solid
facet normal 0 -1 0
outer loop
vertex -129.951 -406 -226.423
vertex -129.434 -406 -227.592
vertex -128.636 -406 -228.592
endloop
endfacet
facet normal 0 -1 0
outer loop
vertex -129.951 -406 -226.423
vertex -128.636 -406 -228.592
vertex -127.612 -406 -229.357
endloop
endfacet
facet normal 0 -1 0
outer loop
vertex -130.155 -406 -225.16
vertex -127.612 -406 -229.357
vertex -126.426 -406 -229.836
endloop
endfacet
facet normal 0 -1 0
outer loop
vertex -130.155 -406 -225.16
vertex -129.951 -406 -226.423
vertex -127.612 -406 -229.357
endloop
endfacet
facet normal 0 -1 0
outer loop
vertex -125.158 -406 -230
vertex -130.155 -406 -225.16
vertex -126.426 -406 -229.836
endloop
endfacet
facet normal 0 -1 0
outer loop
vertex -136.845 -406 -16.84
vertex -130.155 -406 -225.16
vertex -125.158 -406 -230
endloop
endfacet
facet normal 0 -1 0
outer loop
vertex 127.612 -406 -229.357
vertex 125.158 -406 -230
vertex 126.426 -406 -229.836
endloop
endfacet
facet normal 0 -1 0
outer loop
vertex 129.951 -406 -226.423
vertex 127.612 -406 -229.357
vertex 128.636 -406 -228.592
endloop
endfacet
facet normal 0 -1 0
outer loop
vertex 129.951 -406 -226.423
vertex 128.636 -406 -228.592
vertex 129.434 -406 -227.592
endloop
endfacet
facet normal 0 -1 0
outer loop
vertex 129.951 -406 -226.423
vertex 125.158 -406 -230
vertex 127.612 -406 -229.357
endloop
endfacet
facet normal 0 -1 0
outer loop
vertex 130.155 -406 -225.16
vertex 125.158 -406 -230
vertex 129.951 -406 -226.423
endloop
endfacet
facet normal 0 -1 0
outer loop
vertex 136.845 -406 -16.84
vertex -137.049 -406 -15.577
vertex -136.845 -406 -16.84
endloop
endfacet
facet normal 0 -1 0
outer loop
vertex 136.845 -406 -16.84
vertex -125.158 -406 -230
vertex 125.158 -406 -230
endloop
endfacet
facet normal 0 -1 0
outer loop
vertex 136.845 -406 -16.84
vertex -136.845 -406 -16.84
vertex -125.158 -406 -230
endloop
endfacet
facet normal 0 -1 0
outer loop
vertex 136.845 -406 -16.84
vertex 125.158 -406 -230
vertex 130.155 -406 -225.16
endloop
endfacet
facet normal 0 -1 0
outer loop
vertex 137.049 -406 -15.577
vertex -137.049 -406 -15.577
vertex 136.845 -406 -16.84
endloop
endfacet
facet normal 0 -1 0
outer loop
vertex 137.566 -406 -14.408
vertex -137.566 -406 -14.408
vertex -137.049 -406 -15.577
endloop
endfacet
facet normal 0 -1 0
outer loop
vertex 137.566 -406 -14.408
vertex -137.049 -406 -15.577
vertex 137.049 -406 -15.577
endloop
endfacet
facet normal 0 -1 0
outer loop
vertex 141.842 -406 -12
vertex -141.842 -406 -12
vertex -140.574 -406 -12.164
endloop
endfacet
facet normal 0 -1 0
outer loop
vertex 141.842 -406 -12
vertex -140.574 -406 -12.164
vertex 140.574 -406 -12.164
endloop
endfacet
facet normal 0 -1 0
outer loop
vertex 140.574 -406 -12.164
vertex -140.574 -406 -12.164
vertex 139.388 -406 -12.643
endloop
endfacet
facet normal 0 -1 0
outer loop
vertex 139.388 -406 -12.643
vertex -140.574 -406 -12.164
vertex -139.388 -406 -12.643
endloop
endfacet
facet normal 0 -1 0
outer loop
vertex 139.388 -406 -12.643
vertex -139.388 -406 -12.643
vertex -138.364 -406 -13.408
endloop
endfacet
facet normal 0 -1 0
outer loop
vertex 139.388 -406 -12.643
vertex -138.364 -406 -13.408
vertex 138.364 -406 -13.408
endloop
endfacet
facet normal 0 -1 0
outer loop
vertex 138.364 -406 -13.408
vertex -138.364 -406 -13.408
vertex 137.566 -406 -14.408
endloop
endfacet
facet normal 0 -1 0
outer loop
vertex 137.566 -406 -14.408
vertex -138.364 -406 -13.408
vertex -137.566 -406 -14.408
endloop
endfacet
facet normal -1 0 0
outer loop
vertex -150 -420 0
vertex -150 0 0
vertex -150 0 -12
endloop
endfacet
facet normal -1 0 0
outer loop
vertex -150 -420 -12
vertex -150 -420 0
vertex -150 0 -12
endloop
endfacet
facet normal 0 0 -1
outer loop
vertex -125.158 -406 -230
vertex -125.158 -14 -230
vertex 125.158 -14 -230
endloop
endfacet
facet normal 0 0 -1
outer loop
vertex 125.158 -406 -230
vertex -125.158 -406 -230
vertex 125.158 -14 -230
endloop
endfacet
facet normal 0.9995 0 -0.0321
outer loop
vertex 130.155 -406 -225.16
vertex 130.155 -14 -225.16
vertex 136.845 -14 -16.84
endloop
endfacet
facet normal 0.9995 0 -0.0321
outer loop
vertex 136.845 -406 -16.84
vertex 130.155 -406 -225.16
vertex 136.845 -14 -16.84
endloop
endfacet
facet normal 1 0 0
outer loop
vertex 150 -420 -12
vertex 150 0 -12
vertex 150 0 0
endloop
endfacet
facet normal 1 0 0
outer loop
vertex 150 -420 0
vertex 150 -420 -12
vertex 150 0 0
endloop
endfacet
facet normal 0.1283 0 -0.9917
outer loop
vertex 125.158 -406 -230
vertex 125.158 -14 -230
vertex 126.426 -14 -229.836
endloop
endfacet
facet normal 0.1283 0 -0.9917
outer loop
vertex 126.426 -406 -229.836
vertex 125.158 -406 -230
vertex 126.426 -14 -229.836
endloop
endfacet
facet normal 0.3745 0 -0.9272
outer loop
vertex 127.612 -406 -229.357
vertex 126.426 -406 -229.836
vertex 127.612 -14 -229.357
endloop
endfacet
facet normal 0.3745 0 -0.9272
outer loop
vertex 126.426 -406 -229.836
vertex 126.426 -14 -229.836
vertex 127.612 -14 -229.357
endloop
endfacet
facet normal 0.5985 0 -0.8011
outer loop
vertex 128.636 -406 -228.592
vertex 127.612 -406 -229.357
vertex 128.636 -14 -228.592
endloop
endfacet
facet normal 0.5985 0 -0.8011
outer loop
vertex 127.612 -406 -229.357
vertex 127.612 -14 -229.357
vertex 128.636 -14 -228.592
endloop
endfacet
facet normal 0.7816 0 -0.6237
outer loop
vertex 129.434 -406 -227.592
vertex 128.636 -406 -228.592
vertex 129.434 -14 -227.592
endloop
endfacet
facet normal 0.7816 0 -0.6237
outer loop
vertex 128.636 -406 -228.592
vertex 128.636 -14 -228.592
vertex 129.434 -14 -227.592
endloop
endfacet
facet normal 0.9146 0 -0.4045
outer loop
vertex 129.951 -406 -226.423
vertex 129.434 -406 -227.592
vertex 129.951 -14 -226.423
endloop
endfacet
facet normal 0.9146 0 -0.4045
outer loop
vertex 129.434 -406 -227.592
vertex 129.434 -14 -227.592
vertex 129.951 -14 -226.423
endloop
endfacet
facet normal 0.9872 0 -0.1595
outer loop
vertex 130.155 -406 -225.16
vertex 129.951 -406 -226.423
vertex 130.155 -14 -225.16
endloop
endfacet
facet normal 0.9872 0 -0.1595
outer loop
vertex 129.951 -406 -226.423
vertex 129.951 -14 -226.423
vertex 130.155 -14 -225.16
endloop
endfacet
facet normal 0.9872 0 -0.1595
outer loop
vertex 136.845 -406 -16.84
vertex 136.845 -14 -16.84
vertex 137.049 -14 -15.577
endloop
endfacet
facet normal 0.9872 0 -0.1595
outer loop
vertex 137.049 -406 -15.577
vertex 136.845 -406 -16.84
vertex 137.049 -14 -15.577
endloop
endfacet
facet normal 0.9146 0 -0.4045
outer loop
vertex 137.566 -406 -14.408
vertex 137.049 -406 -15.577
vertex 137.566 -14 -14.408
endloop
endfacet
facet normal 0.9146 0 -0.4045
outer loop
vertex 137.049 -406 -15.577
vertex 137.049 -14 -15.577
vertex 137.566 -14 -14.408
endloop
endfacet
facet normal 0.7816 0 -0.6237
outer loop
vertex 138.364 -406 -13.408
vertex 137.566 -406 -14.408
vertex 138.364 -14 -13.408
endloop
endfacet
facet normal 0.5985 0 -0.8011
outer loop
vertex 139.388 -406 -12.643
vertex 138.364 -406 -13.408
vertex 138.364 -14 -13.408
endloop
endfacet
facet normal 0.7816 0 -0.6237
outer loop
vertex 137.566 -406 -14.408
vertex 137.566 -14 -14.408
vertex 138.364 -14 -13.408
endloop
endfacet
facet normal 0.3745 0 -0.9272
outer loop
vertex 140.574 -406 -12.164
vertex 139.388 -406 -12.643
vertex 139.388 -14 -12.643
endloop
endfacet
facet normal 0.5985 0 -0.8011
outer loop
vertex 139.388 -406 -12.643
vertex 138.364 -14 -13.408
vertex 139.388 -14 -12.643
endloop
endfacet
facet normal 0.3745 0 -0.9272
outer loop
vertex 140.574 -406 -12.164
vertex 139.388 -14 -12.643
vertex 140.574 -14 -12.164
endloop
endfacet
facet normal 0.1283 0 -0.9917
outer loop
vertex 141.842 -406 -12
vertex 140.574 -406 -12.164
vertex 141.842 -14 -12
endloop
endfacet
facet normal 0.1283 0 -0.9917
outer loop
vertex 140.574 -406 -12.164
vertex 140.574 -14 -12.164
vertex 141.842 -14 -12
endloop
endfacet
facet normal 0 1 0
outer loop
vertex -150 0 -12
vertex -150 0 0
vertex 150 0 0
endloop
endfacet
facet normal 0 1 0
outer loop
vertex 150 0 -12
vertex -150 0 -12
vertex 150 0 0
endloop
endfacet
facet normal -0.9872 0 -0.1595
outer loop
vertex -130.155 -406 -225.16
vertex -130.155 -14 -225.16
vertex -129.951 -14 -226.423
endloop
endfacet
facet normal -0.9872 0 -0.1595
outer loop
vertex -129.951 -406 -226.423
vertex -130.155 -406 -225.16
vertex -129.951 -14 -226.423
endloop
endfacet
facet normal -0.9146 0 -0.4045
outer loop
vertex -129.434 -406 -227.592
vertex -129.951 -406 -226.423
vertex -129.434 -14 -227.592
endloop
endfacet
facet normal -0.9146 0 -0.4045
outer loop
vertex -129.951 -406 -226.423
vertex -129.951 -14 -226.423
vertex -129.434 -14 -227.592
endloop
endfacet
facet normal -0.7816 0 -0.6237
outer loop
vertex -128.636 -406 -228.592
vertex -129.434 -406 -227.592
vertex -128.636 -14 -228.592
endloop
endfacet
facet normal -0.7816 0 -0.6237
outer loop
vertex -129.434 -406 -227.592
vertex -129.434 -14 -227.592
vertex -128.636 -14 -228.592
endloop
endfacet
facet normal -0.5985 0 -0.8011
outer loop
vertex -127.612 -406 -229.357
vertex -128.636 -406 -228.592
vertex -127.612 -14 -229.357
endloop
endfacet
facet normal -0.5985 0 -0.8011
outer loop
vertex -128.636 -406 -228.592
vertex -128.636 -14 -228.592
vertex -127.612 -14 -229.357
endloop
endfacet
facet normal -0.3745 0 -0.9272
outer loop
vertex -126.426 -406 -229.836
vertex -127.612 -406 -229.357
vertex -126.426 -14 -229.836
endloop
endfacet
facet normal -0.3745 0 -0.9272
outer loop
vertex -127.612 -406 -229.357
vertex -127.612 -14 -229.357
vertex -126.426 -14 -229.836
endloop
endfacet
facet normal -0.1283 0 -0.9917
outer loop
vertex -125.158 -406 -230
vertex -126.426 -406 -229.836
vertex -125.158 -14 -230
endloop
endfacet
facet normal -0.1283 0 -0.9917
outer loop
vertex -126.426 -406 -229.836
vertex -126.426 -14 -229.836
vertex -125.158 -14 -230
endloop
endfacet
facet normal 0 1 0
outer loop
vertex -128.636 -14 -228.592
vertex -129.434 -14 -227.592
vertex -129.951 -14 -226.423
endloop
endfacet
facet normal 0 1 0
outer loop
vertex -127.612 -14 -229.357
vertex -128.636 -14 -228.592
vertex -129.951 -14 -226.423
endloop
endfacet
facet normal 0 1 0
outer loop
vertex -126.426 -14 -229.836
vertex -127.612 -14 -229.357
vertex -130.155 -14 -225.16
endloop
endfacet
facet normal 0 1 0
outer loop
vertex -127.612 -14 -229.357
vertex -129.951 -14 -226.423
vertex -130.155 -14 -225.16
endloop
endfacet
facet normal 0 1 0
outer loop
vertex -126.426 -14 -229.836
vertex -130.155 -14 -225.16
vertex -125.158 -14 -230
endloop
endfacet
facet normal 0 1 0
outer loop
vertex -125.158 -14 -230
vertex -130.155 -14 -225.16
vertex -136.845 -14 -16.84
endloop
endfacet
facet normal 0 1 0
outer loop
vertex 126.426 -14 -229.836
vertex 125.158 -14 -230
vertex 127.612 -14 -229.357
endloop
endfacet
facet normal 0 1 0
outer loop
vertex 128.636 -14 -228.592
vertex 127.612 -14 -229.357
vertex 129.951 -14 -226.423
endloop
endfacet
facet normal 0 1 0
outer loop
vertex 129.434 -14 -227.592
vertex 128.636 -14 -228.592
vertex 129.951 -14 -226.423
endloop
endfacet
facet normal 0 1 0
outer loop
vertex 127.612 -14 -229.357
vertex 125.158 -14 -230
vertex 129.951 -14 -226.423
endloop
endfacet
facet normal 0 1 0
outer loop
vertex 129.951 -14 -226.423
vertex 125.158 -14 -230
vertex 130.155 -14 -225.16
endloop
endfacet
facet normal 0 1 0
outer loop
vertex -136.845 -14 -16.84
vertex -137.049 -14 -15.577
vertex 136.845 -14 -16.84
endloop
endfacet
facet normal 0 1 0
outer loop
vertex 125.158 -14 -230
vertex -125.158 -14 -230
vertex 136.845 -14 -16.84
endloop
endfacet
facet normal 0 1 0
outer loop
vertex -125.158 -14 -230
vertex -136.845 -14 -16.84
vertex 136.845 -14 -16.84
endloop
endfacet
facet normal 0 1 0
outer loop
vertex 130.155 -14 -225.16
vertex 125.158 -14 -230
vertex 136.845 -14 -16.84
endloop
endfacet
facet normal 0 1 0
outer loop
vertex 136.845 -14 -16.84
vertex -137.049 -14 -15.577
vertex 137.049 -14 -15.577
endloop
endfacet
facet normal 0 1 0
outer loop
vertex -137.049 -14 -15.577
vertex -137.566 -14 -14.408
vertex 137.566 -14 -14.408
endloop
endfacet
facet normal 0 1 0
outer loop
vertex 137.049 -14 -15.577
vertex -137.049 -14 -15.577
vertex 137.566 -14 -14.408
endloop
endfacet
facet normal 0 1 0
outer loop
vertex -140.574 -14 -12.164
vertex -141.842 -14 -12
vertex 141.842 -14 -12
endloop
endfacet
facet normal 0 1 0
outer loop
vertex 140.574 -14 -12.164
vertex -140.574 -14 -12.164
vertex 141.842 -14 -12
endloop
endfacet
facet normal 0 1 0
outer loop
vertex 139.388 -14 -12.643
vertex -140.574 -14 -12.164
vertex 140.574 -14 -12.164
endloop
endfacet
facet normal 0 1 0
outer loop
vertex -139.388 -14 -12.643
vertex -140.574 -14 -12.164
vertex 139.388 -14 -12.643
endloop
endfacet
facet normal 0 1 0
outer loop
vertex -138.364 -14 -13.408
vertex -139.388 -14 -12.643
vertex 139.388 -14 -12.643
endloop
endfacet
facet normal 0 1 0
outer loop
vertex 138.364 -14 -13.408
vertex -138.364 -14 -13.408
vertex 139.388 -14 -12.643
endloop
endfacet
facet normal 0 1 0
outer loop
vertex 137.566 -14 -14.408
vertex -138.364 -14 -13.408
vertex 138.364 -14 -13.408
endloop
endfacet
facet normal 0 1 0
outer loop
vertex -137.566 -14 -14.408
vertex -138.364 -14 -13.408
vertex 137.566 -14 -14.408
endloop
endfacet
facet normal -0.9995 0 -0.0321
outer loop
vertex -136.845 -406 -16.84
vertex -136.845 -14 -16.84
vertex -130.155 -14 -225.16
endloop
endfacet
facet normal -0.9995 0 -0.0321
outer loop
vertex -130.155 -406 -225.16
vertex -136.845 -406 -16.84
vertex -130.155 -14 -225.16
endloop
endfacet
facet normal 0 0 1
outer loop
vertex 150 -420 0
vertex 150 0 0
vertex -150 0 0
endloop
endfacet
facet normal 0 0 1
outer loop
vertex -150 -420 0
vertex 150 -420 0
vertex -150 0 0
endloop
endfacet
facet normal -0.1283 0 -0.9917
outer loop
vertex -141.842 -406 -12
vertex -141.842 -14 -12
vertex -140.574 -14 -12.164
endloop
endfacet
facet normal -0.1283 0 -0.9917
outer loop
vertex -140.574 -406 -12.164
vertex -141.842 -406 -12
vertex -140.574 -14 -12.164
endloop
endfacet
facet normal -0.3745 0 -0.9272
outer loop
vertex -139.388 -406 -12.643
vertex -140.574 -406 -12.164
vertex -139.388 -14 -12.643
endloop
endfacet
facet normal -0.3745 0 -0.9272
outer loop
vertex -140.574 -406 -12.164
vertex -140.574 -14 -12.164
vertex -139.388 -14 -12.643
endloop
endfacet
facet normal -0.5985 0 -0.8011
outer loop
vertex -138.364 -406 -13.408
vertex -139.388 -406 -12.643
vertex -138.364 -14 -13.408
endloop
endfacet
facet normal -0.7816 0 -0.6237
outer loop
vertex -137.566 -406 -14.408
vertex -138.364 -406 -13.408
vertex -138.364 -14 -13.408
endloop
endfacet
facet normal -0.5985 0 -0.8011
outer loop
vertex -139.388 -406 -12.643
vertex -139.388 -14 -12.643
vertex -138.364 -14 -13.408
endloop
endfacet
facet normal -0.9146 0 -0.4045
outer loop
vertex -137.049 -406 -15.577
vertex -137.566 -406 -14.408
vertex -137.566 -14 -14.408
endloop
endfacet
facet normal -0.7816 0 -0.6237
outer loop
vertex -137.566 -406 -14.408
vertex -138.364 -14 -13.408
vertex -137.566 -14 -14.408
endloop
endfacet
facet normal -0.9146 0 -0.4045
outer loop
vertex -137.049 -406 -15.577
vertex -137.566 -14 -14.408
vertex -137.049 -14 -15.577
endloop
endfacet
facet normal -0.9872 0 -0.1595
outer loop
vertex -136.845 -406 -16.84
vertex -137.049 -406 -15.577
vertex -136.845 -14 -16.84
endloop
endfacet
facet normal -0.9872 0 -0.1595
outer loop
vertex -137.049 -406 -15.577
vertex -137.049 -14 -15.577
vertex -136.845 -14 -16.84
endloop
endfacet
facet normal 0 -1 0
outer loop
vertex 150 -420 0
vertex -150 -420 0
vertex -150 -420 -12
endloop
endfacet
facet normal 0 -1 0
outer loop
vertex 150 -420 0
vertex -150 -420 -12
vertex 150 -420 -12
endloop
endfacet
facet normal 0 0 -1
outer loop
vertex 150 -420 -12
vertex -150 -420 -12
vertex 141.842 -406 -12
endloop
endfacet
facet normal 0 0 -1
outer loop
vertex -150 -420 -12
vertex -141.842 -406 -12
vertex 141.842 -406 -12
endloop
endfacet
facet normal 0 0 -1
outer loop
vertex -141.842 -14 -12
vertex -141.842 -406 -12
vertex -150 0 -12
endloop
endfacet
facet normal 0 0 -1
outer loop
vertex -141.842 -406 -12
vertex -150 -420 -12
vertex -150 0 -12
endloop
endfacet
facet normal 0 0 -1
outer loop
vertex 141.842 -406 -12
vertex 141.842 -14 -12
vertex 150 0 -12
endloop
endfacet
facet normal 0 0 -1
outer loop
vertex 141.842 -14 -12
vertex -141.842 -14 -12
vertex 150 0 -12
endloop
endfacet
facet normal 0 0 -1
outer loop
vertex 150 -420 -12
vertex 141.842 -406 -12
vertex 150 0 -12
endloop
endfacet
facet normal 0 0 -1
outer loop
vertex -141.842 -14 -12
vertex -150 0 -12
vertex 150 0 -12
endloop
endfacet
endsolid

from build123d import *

# Parameters (mm, degrees)
F1_DEPTH = 420
F3_DEPTH = 14


# Not quite as in the source:
# - a pattern or mirror of a feature is missing from the dataset's text; its kind, count and spacing are read off the source's solid


with BuildPart() as f1:
    # F0 (on Front) → F1 (new body)
    with BuildSketch(Plane.XZ):
        with BuildLine():
            Line((150, 0), (0, 0))
            Line((0, 0), (-150, 0))
            Line((-150, 0), (-150, -12))
            Line((-150, -12), (-141.8420265222, -12))
            ThreePointArc((-141.8420265222, -12), (-138.3636891874, -13.4081802125), (-136.8446021756, -16.8395322458))
            Line((-136.8446021756, -16.8395322458), (-130.1553978244, -225.1604677542))
            ThreePointArc((-130.1553978244, -225.1604677542), (-128.6363108126, -228.5918197875), (-125.1579734778, -230))
            Line((-125.1579734778, -230), (0, -230))
            Line((0, -230), (125.1579734778, -230))
            ThreePointArc((125.1579734778, -230), (128.6363108126, -228.5918197875), (130.1553978244, -225.1604677542))
            Line((130.1553978244, -225.1604677542), (136.8446021756, -16.8395322458))
            ThreePointArc((136.8446021756, -16.8395322458), (138.3636891874, -13.4081802125), (141.8420265222, -12))
            Line((141.8420265222, -12), (150, -12))
            Line((150, -12), (150, 0))
        make_face()
    extrude(amount=F1_DEPTH)

    # F2 (on face) → F3 (cut)
    with BuildSketch(Plane.XZ.offset(420)):
        with BuildLine():
            Line((141.8420265222, -12), (-141.8420265222, -12))
            ThreePointArc((-141.8420265222, -12), (-138.3636891874, -13.4081802125), (-136.8446021756, -16.8395322458))
            Line((-136.8446021756, -16.8395322458), (-130.1553978244, -225.1604677542))
            ThreePointArc((-130.1553978244, -225.1604677542), (-128.6363108126, -228.5918197875), (-125.1579734778, -230))
            Line((-125.1579734778, -230), (125.1579734778, -230))
            ThreePointArc((125.1579734778, -230), (128.6363108126, -228.5918197875), (130.1553978244, -225.1604677542))
            Line((130.1553978244, -225.1604677542), (136.8446021756, -16.8395322458))
            ThreePointArc((136.8446021756, -16.8395322458), (138.3636891874, -13.4081802125), (141.8420265222, -12))
        make_face()
    f3 = extrude(amount=-F3_DEPTH, mode=Mode.SUBTRACT)

    # F3_copies: F3 across plane
    add(f3.mirror(Plane.ZX.offset(-210)), mode=Mode.SUBTRACT)


solid = f1.part
